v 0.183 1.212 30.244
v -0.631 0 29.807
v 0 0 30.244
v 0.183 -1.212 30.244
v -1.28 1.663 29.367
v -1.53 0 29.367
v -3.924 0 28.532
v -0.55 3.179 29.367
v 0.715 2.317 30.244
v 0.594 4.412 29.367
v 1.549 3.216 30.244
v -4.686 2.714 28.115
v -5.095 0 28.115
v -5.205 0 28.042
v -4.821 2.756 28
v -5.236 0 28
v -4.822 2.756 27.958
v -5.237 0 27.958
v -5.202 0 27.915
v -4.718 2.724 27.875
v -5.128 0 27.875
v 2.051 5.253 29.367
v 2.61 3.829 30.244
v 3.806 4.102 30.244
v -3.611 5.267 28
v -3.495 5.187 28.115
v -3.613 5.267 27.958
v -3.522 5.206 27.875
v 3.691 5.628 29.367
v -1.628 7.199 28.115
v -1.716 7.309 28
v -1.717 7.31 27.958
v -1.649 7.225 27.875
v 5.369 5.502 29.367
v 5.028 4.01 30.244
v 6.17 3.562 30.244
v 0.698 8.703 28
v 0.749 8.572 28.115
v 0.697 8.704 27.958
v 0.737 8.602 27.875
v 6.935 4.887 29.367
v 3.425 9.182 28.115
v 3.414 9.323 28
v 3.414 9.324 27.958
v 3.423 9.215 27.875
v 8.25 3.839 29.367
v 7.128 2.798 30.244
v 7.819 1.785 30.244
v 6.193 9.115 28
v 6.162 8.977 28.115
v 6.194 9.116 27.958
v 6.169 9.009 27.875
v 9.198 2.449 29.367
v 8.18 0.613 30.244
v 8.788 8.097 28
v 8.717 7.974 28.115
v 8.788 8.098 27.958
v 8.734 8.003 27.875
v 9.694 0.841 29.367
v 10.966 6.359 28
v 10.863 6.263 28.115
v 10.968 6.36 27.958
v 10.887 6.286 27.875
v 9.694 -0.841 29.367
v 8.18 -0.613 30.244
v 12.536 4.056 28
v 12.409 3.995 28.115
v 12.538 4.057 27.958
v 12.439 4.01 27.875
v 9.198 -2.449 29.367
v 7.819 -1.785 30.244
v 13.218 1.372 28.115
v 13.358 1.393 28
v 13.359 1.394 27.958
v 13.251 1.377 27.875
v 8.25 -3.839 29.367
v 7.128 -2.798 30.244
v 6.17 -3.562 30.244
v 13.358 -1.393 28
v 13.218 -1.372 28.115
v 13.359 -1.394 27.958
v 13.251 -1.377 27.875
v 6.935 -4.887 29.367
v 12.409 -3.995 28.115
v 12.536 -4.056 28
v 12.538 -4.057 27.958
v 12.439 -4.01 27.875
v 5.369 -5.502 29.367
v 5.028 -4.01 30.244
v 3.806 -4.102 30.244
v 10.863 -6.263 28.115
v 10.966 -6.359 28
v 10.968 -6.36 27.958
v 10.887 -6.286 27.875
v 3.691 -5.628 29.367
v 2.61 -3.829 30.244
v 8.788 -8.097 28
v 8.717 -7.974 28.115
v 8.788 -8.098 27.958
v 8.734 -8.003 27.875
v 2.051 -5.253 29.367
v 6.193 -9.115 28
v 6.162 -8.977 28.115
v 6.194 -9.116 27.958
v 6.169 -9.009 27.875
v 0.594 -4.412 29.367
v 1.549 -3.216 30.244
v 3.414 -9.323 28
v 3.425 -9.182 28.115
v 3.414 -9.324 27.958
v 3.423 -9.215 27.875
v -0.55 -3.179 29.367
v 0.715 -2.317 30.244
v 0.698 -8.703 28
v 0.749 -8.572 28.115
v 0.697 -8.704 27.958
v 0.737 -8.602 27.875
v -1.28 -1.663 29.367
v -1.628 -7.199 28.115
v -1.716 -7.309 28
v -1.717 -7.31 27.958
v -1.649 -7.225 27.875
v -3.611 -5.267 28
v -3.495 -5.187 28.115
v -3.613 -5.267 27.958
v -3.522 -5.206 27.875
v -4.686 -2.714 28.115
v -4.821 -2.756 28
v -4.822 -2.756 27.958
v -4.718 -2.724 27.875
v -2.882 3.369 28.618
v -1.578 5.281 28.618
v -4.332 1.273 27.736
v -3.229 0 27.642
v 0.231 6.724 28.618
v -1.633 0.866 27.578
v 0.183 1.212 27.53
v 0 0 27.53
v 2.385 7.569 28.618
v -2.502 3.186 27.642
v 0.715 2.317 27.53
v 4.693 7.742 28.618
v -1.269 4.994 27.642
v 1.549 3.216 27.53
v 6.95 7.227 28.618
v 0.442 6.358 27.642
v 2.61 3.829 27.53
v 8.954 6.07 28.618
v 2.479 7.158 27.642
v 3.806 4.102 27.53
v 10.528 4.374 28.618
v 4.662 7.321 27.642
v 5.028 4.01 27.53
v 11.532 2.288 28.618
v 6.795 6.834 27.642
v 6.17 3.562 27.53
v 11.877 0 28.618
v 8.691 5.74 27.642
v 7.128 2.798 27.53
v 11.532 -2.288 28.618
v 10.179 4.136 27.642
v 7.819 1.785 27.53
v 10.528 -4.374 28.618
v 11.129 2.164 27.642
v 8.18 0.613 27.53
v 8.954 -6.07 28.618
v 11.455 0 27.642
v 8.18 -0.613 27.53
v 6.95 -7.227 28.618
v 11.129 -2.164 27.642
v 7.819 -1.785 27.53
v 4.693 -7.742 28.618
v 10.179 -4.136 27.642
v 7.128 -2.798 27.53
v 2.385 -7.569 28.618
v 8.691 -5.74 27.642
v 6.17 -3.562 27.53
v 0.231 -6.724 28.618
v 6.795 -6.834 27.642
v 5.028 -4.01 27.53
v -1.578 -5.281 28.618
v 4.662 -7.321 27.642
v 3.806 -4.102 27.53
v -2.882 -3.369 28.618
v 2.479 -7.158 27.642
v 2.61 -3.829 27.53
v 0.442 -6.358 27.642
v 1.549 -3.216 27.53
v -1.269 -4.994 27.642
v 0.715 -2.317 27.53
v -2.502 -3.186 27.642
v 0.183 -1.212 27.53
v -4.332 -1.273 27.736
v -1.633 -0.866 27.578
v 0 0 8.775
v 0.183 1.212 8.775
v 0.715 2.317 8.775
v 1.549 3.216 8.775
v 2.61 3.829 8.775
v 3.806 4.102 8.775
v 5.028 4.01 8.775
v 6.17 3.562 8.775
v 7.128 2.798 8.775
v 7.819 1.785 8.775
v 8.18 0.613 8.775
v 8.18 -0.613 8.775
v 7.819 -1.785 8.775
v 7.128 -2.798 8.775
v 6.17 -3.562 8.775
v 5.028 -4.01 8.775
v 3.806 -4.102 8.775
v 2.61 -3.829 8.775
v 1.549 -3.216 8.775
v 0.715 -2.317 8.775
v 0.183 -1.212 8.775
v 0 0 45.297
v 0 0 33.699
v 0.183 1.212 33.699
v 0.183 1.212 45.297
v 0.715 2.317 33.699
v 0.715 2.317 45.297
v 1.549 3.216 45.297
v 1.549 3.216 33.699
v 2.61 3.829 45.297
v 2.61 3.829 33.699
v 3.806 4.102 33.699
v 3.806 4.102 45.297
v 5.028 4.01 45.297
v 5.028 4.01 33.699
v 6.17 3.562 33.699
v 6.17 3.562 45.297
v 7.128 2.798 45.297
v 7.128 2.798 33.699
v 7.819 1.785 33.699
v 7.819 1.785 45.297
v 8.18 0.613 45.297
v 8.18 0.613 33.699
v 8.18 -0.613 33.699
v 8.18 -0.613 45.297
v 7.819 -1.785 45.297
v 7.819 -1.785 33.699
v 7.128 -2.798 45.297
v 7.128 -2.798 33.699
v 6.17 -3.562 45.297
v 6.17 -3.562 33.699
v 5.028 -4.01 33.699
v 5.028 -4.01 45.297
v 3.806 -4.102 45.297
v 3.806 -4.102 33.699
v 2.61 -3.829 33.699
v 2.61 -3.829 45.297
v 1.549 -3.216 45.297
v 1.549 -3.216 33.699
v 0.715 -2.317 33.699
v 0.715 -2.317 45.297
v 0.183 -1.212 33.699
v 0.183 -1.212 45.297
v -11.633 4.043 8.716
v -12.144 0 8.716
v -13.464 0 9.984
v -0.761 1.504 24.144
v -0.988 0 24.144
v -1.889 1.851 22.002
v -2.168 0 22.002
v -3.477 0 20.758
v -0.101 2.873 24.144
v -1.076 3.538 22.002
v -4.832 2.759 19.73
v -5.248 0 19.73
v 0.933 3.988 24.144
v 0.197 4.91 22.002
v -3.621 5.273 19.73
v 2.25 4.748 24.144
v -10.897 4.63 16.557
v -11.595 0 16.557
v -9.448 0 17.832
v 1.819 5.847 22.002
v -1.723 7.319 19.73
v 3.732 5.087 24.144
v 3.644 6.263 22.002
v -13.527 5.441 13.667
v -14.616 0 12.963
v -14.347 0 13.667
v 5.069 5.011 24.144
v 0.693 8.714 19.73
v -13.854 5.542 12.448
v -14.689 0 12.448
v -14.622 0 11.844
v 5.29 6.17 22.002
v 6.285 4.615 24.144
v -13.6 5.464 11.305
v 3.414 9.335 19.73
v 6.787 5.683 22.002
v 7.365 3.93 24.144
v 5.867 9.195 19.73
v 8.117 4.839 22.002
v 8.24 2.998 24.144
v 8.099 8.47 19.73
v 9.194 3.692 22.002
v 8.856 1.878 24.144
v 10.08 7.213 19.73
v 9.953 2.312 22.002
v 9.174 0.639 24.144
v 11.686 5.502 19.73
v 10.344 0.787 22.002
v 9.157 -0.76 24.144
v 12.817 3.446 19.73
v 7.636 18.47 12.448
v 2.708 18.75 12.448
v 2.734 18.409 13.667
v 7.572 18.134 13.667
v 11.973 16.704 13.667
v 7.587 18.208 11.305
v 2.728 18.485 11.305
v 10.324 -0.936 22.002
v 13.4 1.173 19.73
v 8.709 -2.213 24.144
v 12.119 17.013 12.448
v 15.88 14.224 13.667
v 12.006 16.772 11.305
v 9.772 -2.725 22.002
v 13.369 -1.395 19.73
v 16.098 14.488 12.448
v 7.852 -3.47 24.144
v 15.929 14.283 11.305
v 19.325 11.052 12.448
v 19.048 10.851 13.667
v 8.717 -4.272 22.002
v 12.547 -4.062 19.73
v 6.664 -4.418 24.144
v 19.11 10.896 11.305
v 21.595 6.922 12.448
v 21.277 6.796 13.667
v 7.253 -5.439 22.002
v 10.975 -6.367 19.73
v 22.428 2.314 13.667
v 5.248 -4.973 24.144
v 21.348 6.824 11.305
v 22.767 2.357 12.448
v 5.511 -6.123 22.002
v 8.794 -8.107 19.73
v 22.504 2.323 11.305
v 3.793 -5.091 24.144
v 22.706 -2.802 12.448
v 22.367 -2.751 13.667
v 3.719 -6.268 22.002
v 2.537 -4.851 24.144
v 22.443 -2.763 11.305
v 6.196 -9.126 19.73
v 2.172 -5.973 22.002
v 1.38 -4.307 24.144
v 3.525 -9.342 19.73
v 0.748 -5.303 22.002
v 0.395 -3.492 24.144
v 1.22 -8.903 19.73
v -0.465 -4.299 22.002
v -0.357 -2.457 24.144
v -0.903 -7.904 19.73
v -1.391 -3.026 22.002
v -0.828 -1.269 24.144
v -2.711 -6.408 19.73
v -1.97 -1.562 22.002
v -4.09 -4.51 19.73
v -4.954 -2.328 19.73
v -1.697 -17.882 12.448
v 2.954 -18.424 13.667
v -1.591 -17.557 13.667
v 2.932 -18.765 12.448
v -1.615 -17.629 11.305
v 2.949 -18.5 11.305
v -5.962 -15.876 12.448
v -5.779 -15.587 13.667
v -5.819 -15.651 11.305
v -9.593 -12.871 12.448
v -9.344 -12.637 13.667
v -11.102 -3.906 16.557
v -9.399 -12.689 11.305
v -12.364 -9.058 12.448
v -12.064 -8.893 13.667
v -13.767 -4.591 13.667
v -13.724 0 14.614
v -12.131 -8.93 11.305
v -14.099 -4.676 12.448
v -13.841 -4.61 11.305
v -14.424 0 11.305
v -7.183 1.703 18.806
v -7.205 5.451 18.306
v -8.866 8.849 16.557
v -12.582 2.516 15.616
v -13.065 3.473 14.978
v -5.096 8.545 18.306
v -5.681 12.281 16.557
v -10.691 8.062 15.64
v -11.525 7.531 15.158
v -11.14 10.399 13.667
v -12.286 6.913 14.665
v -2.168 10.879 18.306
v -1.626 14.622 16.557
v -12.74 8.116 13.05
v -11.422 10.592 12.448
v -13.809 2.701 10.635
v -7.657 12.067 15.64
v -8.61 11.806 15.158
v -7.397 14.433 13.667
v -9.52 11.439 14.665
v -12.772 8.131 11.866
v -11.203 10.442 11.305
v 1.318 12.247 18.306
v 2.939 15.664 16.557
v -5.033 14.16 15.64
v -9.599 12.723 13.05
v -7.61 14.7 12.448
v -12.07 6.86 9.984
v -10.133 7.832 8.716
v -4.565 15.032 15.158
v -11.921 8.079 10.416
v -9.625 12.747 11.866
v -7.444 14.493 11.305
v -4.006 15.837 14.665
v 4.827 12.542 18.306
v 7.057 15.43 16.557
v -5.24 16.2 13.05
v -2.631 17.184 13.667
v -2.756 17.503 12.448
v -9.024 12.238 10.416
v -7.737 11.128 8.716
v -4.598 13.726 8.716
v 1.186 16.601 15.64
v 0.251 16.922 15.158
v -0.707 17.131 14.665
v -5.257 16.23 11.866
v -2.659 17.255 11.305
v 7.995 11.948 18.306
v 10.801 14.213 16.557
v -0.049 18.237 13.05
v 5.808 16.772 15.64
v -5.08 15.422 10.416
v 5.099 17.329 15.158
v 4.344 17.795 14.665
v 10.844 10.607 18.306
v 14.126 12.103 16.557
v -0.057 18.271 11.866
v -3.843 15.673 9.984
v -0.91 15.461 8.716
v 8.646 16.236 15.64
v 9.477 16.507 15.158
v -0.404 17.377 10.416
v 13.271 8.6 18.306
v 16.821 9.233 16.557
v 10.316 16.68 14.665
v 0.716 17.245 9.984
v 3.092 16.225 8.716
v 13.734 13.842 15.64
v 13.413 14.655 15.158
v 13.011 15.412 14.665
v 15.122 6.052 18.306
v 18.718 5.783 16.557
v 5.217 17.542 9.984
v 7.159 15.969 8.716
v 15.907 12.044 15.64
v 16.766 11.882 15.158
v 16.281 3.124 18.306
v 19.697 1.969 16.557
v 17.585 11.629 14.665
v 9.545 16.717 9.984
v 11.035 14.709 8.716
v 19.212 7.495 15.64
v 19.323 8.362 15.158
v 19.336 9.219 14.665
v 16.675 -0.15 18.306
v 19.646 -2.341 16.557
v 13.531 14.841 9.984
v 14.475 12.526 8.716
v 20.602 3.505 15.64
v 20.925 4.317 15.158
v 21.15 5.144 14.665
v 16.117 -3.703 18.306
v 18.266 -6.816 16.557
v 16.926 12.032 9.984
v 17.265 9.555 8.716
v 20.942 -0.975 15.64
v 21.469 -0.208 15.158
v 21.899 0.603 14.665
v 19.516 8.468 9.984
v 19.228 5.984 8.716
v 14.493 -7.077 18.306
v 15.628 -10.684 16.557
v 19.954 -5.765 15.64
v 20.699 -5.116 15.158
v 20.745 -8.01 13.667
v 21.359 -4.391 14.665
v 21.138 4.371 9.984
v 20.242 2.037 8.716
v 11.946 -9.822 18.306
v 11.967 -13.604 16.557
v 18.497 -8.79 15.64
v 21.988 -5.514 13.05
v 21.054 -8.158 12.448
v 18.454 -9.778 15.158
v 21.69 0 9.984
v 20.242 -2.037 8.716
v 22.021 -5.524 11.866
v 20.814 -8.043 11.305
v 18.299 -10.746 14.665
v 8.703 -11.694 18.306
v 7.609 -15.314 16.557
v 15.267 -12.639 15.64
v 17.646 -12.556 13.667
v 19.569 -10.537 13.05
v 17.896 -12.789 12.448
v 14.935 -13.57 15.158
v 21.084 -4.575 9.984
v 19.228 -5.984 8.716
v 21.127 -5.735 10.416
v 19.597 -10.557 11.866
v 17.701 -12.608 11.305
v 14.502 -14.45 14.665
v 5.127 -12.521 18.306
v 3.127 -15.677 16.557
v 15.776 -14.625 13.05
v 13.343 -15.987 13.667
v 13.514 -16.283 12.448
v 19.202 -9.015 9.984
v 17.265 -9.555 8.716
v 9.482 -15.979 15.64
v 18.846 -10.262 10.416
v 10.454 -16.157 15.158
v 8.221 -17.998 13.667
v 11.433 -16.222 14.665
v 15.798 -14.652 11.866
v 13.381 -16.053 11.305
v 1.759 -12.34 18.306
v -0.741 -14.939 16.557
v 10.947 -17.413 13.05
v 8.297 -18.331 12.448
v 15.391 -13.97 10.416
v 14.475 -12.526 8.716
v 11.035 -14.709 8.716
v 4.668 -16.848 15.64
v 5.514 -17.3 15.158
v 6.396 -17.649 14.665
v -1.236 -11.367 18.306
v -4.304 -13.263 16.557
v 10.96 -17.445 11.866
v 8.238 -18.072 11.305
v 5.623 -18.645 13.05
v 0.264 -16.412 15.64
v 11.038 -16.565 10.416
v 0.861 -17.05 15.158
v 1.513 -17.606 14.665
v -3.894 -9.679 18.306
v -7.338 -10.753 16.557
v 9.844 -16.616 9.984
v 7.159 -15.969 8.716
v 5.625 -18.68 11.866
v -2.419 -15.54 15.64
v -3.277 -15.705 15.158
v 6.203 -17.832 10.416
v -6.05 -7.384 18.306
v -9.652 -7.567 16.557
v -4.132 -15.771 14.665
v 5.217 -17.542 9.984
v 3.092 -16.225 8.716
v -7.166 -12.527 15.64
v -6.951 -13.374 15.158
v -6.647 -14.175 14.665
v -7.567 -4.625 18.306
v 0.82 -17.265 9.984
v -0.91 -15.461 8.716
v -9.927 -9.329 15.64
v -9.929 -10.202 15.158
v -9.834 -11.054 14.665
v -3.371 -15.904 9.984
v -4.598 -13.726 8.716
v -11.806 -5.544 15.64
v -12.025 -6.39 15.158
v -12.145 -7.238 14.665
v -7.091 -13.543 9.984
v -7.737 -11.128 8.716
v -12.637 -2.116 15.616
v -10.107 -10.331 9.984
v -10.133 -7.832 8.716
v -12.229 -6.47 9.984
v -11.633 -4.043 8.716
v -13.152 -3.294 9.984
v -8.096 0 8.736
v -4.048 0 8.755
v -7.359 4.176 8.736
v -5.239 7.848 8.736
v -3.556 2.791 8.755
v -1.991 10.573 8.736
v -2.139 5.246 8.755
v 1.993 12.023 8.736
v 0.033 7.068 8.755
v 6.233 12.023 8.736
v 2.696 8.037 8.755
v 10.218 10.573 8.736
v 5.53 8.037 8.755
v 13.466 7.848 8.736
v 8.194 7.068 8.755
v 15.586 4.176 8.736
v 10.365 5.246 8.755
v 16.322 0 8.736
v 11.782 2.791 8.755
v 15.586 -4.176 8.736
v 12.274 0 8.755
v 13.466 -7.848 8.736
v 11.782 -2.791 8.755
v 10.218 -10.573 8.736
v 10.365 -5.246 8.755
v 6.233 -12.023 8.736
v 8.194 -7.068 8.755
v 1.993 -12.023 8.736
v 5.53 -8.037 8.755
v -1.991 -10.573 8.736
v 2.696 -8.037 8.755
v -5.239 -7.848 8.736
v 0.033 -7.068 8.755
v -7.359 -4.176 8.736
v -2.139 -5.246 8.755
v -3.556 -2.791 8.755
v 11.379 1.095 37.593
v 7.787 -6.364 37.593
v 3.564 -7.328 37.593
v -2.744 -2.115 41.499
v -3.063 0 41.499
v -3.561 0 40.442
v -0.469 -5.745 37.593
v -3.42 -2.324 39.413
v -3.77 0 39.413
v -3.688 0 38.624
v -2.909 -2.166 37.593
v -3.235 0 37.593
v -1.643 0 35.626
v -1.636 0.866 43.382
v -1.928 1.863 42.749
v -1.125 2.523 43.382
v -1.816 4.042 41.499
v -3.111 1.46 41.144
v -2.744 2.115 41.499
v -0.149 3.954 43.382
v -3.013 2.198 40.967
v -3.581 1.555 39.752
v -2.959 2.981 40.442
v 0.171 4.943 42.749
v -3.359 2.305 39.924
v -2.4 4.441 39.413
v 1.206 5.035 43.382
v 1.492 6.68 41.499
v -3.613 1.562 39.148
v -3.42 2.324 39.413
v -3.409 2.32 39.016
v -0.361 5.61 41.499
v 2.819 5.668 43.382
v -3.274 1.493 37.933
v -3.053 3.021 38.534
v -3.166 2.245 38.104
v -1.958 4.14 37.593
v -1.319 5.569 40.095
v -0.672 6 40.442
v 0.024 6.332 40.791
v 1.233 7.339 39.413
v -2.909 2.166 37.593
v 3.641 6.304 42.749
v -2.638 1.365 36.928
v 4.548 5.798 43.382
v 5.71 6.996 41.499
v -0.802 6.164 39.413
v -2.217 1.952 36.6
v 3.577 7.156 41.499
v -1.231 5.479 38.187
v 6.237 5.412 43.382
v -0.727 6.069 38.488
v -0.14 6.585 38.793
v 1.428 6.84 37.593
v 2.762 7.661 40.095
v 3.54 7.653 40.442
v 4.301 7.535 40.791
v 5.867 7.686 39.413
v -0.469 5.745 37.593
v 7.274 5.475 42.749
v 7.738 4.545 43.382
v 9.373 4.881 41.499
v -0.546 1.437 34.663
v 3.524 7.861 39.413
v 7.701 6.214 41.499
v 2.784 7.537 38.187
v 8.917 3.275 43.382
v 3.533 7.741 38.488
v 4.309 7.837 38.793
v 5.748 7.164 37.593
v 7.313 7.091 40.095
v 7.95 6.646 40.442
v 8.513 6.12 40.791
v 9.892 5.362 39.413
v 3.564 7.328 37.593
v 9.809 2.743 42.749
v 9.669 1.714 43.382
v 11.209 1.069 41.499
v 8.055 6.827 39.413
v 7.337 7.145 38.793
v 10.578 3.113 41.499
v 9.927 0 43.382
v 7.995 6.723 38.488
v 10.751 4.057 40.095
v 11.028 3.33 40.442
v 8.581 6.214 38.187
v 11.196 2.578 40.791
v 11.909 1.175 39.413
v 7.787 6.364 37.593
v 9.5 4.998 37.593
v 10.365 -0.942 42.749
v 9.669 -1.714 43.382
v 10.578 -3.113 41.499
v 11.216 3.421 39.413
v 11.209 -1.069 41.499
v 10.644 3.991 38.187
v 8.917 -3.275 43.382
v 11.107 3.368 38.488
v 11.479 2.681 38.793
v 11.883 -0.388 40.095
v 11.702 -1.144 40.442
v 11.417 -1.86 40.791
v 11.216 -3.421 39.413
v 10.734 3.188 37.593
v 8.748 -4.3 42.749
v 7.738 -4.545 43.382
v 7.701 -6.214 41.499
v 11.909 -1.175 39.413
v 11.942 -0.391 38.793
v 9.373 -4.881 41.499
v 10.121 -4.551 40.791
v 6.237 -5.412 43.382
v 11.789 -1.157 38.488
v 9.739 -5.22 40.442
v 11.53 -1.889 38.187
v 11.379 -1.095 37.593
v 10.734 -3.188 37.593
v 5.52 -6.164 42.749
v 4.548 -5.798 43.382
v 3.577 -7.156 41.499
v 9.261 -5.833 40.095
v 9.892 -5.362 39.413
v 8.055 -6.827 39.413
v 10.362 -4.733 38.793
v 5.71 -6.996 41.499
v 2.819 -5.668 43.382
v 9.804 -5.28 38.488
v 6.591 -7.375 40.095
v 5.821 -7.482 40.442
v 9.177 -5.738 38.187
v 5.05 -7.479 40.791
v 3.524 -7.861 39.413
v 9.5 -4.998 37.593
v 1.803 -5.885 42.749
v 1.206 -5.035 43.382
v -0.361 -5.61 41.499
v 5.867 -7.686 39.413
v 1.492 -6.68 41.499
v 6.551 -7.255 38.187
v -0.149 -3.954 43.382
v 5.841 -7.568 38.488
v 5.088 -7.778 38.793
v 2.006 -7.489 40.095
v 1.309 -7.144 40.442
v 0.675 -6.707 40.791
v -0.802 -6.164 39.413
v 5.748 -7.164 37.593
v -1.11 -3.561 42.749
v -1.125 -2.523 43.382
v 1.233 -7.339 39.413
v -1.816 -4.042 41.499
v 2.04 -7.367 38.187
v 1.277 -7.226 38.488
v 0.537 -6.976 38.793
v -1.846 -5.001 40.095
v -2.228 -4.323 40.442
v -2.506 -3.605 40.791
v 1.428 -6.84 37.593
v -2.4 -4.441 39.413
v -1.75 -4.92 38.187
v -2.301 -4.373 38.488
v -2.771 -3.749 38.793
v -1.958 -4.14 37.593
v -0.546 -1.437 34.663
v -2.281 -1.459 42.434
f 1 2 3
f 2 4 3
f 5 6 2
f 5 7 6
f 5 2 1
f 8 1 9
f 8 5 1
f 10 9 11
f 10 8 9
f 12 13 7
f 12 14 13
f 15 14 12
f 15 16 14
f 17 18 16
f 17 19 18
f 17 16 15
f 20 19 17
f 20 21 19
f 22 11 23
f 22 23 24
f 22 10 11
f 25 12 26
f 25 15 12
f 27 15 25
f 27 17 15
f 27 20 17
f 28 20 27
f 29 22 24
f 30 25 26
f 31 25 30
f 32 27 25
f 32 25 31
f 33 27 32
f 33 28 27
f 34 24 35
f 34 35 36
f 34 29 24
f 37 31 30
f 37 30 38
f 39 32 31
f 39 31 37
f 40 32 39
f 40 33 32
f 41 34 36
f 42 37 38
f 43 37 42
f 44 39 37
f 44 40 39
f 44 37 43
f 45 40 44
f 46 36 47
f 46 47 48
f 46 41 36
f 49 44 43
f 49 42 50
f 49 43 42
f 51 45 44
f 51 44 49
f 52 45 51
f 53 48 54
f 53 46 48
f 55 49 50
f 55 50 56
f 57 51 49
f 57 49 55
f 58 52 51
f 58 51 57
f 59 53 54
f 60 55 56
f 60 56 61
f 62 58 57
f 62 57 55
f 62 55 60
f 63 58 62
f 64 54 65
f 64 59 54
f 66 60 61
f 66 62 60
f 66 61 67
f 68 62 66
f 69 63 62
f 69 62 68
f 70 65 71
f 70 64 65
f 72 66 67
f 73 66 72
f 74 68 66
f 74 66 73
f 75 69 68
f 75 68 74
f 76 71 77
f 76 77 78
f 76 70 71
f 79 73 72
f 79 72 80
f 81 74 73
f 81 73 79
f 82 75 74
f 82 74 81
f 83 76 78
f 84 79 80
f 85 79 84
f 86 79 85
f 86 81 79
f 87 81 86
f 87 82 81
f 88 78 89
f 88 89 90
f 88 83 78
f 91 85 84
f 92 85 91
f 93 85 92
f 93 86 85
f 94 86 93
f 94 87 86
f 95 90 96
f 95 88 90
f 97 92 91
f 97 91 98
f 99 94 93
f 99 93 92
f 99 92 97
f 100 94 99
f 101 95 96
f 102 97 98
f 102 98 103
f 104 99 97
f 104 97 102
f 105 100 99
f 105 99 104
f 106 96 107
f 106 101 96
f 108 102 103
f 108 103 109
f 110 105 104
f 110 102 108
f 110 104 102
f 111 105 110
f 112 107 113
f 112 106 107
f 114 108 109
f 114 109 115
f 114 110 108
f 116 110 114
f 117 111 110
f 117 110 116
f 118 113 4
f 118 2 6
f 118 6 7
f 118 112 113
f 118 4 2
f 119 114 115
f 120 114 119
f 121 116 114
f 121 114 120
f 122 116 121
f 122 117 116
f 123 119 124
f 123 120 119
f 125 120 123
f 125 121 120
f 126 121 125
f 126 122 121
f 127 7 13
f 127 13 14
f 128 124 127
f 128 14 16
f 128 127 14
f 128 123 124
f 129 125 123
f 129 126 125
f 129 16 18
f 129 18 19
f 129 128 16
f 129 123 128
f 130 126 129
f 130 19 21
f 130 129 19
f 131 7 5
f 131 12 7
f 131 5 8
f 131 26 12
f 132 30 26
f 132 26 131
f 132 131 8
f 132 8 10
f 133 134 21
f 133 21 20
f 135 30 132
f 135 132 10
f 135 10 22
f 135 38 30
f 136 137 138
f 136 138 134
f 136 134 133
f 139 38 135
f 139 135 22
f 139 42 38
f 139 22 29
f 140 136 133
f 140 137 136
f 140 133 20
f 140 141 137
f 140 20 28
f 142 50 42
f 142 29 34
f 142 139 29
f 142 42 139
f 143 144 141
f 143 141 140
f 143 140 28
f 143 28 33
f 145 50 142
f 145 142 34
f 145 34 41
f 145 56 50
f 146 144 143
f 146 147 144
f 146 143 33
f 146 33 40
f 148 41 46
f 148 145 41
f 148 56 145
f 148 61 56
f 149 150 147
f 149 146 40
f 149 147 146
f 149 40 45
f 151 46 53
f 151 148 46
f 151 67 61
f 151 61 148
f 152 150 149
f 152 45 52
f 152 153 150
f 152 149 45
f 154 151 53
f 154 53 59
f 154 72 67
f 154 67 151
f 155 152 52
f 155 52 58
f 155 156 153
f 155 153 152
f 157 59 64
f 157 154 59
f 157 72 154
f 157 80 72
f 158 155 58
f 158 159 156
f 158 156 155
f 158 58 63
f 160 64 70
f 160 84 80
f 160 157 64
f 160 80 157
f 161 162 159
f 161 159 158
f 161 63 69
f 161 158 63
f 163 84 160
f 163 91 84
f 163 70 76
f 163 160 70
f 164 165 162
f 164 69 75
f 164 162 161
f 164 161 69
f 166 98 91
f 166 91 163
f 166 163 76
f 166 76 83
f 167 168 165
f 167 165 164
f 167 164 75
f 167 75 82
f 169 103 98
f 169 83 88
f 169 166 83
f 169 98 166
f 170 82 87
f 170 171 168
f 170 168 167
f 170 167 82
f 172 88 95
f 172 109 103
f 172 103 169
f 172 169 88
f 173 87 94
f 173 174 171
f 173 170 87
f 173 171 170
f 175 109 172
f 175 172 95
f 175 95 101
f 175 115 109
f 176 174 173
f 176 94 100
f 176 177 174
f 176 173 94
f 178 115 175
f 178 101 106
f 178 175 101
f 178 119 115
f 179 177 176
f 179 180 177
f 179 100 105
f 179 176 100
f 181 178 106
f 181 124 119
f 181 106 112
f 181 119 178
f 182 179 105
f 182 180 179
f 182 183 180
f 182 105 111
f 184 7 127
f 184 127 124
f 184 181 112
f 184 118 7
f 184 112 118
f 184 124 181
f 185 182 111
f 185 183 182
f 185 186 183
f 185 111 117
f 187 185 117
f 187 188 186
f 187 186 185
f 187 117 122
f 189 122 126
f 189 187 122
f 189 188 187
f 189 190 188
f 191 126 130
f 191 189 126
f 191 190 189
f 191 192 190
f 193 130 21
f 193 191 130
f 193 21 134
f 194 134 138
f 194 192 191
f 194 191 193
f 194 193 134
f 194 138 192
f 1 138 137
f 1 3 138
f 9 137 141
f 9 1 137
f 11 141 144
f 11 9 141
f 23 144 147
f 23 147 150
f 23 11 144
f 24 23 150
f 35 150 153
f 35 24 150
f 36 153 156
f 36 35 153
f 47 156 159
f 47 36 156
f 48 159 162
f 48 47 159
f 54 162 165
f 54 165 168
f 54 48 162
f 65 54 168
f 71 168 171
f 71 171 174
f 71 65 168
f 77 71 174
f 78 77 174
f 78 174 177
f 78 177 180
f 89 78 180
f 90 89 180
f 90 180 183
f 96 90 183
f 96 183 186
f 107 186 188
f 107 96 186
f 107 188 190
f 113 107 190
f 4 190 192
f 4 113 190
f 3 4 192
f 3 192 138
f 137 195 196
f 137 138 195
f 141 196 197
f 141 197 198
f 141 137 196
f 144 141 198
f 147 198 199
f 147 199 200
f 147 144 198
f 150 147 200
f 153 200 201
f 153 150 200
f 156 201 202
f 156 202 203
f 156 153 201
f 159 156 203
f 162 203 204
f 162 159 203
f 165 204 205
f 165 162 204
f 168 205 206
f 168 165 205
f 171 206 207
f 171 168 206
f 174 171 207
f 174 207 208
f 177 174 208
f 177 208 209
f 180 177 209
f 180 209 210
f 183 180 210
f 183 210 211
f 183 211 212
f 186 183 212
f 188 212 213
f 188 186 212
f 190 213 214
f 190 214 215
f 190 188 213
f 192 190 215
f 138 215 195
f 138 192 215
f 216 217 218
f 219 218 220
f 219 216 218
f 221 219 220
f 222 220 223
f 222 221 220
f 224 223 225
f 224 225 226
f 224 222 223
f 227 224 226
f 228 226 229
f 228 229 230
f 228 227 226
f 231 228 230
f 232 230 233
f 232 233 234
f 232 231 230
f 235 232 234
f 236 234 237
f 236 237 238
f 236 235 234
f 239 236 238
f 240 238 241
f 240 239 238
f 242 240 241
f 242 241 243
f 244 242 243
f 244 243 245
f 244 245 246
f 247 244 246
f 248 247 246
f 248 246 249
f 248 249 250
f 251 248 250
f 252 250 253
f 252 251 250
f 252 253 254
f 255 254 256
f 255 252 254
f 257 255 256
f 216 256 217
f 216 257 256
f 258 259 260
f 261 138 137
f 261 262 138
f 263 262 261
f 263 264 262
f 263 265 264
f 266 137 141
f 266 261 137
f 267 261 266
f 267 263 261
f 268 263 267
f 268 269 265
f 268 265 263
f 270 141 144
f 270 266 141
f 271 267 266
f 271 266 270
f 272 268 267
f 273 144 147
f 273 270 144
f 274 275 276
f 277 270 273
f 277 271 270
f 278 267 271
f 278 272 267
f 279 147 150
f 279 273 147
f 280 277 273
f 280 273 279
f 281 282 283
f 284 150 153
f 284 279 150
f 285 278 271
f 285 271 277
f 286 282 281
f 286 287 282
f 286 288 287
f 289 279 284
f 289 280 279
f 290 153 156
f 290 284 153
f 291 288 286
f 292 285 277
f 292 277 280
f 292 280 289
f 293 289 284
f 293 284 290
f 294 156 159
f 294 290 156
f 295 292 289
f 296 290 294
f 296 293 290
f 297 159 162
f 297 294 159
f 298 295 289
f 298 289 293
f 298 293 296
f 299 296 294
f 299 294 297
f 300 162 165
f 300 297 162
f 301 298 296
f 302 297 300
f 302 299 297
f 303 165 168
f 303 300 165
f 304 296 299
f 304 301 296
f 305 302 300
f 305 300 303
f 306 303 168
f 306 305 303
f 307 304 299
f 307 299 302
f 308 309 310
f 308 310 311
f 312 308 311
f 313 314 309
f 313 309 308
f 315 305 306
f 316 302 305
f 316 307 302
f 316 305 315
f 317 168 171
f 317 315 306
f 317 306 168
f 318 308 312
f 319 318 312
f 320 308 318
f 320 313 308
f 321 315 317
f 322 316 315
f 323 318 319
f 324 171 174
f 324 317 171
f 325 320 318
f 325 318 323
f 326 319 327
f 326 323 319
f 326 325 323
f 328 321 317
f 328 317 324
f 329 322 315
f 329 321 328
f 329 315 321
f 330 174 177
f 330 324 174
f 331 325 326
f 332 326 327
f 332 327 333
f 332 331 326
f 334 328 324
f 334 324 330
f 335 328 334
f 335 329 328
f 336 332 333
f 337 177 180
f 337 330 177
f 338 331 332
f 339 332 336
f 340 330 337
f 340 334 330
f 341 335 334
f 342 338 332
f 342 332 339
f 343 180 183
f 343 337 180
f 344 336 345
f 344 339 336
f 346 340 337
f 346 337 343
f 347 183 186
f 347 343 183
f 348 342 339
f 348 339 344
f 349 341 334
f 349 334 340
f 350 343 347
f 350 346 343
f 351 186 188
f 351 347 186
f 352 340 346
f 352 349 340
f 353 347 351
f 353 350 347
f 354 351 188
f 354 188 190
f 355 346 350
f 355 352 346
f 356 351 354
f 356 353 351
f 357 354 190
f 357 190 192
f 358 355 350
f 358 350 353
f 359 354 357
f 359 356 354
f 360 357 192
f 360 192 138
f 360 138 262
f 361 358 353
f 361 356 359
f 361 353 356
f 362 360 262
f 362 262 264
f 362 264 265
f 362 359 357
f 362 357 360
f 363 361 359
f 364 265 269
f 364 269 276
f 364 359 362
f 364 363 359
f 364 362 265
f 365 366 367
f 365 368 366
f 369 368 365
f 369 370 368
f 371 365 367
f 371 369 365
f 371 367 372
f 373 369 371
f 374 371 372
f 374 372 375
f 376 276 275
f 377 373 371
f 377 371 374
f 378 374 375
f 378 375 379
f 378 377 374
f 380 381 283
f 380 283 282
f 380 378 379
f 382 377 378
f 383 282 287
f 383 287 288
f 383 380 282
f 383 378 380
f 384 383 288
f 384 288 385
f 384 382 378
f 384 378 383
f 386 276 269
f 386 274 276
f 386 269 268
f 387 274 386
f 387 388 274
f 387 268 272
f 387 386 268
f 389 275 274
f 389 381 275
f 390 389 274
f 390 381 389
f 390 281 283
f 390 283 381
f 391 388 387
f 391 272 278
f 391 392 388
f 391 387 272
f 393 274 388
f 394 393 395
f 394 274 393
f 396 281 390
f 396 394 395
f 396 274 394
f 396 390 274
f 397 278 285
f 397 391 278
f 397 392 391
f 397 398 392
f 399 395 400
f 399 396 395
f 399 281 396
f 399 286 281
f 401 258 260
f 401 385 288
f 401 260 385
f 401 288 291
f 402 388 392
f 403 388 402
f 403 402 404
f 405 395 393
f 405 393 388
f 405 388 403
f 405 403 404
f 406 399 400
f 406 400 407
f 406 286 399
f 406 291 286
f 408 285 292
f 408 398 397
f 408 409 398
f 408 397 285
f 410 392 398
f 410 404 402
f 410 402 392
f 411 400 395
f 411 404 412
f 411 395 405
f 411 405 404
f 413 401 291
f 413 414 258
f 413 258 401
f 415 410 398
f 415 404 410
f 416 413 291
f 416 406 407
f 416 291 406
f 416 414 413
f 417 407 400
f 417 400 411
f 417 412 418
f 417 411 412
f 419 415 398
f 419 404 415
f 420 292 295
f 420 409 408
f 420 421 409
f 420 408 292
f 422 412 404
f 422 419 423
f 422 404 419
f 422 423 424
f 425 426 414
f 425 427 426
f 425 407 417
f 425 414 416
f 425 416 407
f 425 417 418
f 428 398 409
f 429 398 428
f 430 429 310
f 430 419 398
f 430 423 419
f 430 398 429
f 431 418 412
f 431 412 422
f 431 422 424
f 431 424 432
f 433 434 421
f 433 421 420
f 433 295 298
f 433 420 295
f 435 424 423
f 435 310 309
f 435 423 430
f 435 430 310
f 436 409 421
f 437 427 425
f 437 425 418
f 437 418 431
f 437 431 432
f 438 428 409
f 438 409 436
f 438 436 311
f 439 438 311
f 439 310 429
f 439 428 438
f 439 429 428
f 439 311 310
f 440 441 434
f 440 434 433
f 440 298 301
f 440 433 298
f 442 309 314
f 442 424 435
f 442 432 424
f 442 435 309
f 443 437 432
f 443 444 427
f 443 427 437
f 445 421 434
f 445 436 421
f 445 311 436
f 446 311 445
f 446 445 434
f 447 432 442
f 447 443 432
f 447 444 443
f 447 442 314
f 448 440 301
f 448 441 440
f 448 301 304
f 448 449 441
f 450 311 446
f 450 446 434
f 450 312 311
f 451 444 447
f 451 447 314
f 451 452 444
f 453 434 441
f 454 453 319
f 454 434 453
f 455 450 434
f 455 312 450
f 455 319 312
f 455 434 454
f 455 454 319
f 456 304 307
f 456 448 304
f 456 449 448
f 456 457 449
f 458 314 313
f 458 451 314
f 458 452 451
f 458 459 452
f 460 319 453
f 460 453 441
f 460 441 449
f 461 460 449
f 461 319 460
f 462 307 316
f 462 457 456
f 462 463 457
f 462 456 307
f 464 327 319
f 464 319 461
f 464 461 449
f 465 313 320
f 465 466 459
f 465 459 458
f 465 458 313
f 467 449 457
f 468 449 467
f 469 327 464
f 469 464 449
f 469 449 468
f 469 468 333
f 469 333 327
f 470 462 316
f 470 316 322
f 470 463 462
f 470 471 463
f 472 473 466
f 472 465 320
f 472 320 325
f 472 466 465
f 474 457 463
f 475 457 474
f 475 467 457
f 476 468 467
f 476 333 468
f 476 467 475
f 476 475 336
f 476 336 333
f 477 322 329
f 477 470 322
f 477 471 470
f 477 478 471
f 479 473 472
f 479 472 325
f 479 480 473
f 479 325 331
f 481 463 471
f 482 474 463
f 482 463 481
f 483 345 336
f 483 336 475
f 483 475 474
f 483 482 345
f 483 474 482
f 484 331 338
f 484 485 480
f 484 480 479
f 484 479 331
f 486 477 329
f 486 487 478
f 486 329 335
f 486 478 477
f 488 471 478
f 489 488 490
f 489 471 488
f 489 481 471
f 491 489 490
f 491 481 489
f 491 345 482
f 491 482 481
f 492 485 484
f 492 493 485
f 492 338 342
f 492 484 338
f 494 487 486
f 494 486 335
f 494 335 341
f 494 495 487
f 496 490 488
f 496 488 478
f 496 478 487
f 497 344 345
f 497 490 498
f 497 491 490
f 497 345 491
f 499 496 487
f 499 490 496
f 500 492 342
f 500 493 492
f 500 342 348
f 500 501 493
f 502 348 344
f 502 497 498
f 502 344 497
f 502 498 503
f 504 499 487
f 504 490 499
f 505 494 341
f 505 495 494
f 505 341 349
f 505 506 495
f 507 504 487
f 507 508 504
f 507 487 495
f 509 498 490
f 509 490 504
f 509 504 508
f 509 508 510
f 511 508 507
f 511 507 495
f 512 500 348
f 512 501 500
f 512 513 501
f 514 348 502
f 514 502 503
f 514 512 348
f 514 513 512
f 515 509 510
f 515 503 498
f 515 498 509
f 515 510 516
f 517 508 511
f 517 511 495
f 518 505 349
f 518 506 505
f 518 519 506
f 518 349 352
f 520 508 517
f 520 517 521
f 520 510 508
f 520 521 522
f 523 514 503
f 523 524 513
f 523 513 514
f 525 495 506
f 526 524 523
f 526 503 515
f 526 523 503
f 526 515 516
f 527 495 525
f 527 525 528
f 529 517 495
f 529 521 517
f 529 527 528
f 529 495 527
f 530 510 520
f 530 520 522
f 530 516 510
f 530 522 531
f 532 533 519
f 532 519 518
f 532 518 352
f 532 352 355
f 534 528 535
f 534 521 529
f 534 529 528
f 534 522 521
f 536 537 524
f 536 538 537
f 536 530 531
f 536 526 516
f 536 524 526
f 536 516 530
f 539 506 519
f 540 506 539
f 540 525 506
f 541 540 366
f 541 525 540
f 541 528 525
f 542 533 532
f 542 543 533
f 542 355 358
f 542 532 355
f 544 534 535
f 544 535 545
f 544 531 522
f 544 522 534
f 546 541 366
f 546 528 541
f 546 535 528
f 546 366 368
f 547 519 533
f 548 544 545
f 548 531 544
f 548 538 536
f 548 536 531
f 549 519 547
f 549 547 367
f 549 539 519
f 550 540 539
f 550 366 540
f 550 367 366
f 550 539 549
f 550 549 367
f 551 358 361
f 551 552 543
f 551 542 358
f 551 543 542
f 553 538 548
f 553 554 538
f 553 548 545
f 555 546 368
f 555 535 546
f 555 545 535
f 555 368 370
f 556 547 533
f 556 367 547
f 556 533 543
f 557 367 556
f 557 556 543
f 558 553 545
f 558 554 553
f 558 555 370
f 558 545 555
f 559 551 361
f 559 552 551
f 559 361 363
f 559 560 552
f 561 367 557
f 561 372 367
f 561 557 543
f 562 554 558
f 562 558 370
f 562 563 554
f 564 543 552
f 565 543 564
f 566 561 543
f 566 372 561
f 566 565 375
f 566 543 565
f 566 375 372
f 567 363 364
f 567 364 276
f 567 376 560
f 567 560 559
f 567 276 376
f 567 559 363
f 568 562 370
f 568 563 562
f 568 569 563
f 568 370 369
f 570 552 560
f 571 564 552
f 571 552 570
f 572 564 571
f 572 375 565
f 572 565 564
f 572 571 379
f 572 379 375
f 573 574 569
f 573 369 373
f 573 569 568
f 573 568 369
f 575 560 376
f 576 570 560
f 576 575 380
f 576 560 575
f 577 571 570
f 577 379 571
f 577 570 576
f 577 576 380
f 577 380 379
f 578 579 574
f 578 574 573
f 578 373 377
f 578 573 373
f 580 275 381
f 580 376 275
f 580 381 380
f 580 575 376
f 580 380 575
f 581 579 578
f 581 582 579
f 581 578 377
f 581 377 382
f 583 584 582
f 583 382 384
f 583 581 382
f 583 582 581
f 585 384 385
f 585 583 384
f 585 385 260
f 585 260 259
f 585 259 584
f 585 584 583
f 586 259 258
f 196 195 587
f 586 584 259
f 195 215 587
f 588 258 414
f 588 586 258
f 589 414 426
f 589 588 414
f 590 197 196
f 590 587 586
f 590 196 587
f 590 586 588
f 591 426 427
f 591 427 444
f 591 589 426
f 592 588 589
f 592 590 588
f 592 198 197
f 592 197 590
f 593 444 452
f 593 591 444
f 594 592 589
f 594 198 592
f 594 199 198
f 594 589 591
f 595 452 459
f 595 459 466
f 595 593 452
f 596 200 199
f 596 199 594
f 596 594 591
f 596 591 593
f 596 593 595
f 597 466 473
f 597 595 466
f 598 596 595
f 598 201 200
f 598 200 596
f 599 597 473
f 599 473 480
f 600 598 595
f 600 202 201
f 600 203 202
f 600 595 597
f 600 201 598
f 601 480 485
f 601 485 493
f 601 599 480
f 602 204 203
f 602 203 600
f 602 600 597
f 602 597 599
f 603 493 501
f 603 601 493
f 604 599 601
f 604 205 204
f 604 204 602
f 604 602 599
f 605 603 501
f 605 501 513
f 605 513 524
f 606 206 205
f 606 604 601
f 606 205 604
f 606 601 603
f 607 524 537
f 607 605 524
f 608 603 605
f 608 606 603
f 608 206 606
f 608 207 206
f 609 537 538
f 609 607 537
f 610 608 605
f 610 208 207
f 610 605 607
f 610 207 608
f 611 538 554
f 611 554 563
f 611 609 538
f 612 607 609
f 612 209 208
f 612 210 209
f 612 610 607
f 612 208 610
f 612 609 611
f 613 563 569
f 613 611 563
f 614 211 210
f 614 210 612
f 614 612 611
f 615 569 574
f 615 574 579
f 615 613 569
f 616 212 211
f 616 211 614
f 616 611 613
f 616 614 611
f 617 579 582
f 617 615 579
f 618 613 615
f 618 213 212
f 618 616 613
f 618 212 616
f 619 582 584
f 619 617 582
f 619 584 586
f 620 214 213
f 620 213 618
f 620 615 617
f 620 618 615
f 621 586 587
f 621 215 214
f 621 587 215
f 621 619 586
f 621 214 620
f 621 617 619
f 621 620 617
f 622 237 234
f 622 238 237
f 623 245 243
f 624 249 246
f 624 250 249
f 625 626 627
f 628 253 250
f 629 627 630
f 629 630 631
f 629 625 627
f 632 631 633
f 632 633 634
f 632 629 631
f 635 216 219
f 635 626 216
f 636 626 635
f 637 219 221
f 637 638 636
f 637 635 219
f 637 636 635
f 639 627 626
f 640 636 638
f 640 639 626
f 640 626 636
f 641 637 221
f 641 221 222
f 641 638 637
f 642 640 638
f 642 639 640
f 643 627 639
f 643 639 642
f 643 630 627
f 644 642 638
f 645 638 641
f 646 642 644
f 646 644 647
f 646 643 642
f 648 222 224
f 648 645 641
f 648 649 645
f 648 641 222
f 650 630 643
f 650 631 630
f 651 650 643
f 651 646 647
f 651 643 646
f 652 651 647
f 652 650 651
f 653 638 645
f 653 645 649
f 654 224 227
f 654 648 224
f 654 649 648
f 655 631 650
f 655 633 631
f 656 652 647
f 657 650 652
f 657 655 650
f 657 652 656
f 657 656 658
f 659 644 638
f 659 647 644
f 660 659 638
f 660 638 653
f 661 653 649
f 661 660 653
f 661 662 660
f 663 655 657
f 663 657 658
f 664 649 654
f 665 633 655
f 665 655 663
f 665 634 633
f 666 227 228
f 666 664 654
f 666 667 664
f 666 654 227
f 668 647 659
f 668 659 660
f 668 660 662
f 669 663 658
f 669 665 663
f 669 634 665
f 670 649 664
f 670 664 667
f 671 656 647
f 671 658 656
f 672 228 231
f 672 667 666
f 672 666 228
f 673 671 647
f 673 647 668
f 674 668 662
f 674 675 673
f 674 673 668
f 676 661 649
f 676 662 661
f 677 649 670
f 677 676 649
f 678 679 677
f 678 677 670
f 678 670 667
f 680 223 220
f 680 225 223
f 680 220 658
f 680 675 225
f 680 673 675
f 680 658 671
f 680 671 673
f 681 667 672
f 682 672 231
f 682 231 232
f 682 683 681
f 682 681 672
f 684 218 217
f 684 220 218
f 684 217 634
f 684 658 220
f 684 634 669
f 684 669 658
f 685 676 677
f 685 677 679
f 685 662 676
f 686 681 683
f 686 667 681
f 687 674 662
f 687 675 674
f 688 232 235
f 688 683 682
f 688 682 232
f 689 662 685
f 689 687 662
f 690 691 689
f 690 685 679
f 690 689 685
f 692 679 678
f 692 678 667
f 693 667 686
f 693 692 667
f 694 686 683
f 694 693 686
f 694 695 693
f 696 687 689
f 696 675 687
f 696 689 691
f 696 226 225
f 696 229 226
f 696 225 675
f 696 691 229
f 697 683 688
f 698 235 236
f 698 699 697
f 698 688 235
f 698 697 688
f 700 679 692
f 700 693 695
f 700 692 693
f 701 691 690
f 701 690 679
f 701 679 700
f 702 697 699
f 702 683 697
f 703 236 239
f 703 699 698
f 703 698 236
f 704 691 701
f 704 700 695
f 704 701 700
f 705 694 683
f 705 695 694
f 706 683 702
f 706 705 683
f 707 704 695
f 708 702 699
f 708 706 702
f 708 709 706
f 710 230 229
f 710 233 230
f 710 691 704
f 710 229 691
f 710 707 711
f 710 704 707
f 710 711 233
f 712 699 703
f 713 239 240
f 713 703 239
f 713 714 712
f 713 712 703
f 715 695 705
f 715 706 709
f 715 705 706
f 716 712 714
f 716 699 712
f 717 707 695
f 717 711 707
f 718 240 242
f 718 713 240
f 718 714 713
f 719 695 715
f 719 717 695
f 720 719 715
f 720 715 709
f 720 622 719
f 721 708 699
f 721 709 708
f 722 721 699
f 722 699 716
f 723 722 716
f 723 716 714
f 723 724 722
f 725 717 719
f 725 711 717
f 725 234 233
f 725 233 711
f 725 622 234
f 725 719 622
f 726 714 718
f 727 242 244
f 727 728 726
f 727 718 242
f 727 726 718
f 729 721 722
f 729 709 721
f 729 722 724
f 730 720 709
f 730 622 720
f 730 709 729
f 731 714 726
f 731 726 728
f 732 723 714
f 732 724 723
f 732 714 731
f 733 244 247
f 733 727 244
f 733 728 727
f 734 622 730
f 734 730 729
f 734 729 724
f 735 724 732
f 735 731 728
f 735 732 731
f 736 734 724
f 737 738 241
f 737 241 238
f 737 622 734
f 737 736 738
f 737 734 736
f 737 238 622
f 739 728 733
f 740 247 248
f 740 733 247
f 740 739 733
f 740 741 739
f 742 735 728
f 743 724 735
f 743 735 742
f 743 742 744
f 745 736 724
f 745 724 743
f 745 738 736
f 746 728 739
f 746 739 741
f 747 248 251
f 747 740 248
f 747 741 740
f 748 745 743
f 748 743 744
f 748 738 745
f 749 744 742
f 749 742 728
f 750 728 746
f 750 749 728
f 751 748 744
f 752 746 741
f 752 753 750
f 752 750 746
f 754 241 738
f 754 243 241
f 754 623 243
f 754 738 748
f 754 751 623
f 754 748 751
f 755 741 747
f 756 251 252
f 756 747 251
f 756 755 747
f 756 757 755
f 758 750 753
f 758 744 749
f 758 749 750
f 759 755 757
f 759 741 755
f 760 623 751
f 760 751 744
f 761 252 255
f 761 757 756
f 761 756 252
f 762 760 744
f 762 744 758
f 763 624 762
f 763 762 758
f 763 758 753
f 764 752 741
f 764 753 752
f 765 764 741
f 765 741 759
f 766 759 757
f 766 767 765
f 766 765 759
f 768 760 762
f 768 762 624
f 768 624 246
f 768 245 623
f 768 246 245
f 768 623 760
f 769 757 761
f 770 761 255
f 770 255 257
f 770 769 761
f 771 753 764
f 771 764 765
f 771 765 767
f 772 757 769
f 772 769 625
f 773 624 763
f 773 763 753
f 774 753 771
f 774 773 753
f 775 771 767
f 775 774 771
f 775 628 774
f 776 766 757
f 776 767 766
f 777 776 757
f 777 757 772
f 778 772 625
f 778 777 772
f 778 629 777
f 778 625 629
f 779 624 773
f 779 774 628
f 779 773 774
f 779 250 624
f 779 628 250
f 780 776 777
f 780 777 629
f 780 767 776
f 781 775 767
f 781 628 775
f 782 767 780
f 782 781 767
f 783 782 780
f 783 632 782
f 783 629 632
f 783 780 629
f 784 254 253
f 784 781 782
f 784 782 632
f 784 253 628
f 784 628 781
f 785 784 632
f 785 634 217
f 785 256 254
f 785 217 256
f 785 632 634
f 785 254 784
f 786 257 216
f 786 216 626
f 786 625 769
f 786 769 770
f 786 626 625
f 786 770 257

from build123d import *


with BuildPart() as f1:
    # F0 (on Front) → F1 (revolve)
    with BuildSketch(Plane.XZ):
        with BuildLine():
            Line((0, 21.360527724), (0, 27.5298226625))
            add(Edge.make_bspline(
                [(0, 27.5298226625), (-0.5689546257, 25.2155282415), (-1.7810954, 20.2849933538), (-10.4524495309, 18.2109930533), (-16.2734333671, 12.4853980758), (-13.4330094974, 9.8928680945), (-12.1435010806, 8.7158996612)],
                knots=[0, 0, 0, 0, 0.2544296933, 0.5420548346, 0.792099992, 1, 1, 1, 1], degree=3))
            Line((-12.1435010806, 8.7158996612), (0, 8.7751643732))
            Line((0, 8.7751643732), (0, 21.360527724))
        make_face()
    revolve(axis=Axis((4.1131218895, 0, 27.0362780429), (0, 0, -1)))


with BuildPart() as f1b:
    # F0 (on Front) → F1, piece 2 (revolve)
    with BuildSketch(Plane.XZ):
        with BuildLine():
            Line((0, 27.5298226625), (0, 30.2443113178))
            add(Edge.make_bspline(
                [(0, 30.2443113178), (-1.3882070044, 29.0413526653), (-8.3517811986, 27.7525778934), (-2.7471802647, 27.6030943107), (0, 27.5298226625)],
                knots=[0.6035165989, 0.6035165989, 0.6035165989, 0.6035165989, 0.8056576396, 1, 1, 1, 1], degree=3))
        make_face()
    revolve(axis=Axis((4.1131218895, 0, 27.0362780429), (0, 0, -1)))


with BuildPart() as f1c:
    # F0 (on Front) → F1, piece 3 (revolve)
    with BuildSketch(Plane.XZ):
        with BuildLine():
            Line((0, 33.6991176009), (0, 45.2973917127))
            add(Edge.make_bspline(
                [(0, 45.2973917127), (-2.0256198802, 43.0825093515), (-5.9303409984, 38.8129531456), (-1.1561968652, 35.3927761254), (0, 33.6991176009)],
                knots=[0, 0, 0, 0, 0.2312597199, 0.4457917899, 0.4457917899, 0.4457917899, 0.4457917899], degree=3))
        make_face()
    revolve(axis=Axis((4.1131218895, 0, 27.0362780429), (0, 0, -1)))


solid = Compound([f1.part, f1b.part, f1c.part])
